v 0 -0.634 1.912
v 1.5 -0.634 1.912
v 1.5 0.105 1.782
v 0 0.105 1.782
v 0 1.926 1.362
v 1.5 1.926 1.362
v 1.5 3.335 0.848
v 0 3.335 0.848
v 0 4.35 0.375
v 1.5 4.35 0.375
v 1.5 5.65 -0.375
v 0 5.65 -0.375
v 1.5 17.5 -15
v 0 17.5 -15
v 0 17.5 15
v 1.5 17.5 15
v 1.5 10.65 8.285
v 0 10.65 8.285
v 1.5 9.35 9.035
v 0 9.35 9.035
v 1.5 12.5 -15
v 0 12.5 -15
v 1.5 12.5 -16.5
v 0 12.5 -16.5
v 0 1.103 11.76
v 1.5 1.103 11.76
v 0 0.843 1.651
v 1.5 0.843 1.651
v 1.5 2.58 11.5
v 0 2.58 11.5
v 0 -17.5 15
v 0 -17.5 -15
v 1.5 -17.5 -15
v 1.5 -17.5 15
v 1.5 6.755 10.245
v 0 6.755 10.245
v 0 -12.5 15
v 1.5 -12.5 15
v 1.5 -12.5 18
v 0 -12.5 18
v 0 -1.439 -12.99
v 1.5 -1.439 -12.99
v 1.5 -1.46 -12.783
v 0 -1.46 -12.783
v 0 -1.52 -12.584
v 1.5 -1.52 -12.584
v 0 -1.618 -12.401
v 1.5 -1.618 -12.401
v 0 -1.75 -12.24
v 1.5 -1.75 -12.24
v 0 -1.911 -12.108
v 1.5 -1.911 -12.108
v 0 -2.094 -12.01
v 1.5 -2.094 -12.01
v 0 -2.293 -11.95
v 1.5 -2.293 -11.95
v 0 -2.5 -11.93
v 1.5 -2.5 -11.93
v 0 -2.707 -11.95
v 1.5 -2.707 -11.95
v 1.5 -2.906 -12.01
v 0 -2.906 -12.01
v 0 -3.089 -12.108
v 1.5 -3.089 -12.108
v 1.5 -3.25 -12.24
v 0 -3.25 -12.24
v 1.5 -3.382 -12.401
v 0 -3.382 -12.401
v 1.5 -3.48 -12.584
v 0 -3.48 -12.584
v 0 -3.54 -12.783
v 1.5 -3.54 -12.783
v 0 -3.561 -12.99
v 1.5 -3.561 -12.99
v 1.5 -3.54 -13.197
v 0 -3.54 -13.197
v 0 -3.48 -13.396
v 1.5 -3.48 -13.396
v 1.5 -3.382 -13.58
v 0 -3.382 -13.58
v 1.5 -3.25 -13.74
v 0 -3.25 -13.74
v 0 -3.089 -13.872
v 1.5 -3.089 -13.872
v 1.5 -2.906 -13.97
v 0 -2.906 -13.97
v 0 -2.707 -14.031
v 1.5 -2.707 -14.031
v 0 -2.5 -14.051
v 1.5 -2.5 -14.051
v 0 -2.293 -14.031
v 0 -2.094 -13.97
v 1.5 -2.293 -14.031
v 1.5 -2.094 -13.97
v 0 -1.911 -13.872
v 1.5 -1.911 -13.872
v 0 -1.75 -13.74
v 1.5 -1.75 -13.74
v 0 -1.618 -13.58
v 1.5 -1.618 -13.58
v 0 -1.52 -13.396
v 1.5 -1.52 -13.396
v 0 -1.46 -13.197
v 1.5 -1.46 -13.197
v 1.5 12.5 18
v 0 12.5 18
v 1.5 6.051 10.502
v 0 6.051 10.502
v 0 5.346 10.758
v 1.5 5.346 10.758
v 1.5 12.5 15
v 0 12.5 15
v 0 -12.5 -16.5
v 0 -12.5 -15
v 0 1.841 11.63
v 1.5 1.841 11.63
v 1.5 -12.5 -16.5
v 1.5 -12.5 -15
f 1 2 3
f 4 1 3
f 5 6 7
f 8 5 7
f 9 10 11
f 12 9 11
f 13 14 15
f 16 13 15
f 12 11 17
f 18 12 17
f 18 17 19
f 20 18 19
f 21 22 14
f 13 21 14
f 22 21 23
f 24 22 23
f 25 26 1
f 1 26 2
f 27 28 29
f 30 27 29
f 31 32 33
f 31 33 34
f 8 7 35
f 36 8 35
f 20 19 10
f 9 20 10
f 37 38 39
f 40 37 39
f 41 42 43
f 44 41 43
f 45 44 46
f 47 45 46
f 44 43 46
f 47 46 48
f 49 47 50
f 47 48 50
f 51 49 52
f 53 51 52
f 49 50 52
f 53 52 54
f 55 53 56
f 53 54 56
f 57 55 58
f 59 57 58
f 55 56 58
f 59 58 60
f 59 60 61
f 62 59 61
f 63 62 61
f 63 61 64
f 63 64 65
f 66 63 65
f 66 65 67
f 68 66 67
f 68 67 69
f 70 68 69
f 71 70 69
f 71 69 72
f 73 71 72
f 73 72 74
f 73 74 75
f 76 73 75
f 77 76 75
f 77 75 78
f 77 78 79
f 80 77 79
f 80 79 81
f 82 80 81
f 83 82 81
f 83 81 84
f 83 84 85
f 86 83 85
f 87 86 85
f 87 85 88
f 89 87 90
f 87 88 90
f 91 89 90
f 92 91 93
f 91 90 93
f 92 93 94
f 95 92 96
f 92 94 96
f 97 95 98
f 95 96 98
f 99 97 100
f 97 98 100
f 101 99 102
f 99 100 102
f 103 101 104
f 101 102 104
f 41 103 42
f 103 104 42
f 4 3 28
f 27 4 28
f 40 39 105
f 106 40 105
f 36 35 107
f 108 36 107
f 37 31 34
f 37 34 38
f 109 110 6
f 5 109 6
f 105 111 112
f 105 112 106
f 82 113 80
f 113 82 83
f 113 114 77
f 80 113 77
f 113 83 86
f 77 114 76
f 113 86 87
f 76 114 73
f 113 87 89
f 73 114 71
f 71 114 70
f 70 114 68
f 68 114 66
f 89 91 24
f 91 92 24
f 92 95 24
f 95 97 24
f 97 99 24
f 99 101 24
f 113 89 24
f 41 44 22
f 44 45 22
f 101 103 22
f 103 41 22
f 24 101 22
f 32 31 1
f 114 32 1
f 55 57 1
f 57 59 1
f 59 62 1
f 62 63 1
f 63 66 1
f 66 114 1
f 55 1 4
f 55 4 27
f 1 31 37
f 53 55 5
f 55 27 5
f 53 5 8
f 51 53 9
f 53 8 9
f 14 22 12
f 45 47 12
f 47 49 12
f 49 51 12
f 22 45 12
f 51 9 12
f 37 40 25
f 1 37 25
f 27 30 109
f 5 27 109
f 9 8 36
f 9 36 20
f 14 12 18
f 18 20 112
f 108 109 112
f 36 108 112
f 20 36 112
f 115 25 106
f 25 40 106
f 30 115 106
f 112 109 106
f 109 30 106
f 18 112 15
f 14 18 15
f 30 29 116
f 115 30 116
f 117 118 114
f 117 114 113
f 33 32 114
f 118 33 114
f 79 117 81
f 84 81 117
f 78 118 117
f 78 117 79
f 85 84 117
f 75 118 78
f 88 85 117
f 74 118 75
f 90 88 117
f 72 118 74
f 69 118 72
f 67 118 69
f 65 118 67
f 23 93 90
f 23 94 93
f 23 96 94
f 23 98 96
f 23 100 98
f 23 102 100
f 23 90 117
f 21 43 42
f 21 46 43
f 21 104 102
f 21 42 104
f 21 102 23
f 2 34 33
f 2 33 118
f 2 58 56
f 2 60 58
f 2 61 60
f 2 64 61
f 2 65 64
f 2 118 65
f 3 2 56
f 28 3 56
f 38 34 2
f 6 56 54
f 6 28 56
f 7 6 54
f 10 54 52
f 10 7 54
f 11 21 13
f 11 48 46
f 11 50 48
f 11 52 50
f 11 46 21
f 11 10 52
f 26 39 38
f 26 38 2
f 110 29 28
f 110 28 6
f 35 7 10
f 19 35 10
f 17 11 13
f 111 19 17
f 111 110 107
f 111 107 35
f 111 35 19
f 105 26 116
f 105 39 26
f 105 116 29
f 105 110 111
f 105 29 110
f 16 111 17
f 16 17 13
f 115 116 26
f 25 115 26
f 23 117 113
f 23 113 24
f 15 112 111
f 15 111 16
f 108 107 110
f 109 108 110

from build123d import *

# Parameters (mm, degrees)
F0_W     = 35
F0_H     = 30
F1_DEPTH = 1.5
F2_W     = 25
F2_H     = 3
F3_DEPTH = 1.5
F4_W     = 25
F4_H     = 1.5
F5_DEPTH = 25
F6_R     = 1.0606601718
F7_DEPTH = 1.501


# Not quite as in the source:
# - a pattern or mirror of a feature is missing from the dataset's text; its kind, count and spacing are read off the source's solid


with BuildPart() as f1:
    # F0 (on Right) → F1 (new body)
    with BuildSketch(Plane.YZ):
        Rectangle(F0_W, F0_H)
    extrude(amount=F1_DEPTH)

    # F2 (on face) → F3 (join)
    with BuildSketch(Plane.YZ.offset(1.5)):
        with Locations((0, 16.5)):
            Rectangle(F2_W, F2_H)
    f3 = extrude(amount=-F3_DEPTH)

    # F3_copies: F3 across plane
    add(f3.mirror(Plane(origin=(0, 0, 0.75), x_dir=(-1, 0, 0), z_dir=(0, 0, -1))))

    # F4 (on face) → F5 (cut)
    with BuildSketch(Plane.YZ.offset(1.5)):
        with Locations((0, -17.25)):
            Rectangle(F4_W, F4_H)
    extrude(amount=-F5_DEPTH, mode=Mode.SUBTRACT)

    # F6 (on face) → F7 (cut, through all)
    with BuildSketch(Plane.YZ.offset(1.5)):
        Polygon((-0.6338831498, 1.9119713717), (0.104722665, 1.7817352384), (0.8433284798, 1.6514991052), (2.5798102564, 11.4995766353), (1.8412044417, 11.6298127685), (1.1025986269, 11.7600489018), align=None)
        with Locations((-2.5, -12.9903810568)):
            Circle(F6_R)
        Polygon((1.9255326843, 1.3615233625), (2.6303021499, 1.105008255), (3.3350716155, 0.8484931475), (6.7552730487, 10.2454193554), (6.0505035831, 10.5019344629), (5.3457341176, 10.7584495704), align=None)
        Polygon((4.3504809472, 0.375), (5, 0), (5.6495190528, -0.375), (10.6495190528, 8.2852540378), (10, 8.6602540378), (9.3504809472, 9.0352540378), align=None)
    extrude(amount=-F7_DEPTH, mode=Mode.SUBTRACT)


solid = f1.part
